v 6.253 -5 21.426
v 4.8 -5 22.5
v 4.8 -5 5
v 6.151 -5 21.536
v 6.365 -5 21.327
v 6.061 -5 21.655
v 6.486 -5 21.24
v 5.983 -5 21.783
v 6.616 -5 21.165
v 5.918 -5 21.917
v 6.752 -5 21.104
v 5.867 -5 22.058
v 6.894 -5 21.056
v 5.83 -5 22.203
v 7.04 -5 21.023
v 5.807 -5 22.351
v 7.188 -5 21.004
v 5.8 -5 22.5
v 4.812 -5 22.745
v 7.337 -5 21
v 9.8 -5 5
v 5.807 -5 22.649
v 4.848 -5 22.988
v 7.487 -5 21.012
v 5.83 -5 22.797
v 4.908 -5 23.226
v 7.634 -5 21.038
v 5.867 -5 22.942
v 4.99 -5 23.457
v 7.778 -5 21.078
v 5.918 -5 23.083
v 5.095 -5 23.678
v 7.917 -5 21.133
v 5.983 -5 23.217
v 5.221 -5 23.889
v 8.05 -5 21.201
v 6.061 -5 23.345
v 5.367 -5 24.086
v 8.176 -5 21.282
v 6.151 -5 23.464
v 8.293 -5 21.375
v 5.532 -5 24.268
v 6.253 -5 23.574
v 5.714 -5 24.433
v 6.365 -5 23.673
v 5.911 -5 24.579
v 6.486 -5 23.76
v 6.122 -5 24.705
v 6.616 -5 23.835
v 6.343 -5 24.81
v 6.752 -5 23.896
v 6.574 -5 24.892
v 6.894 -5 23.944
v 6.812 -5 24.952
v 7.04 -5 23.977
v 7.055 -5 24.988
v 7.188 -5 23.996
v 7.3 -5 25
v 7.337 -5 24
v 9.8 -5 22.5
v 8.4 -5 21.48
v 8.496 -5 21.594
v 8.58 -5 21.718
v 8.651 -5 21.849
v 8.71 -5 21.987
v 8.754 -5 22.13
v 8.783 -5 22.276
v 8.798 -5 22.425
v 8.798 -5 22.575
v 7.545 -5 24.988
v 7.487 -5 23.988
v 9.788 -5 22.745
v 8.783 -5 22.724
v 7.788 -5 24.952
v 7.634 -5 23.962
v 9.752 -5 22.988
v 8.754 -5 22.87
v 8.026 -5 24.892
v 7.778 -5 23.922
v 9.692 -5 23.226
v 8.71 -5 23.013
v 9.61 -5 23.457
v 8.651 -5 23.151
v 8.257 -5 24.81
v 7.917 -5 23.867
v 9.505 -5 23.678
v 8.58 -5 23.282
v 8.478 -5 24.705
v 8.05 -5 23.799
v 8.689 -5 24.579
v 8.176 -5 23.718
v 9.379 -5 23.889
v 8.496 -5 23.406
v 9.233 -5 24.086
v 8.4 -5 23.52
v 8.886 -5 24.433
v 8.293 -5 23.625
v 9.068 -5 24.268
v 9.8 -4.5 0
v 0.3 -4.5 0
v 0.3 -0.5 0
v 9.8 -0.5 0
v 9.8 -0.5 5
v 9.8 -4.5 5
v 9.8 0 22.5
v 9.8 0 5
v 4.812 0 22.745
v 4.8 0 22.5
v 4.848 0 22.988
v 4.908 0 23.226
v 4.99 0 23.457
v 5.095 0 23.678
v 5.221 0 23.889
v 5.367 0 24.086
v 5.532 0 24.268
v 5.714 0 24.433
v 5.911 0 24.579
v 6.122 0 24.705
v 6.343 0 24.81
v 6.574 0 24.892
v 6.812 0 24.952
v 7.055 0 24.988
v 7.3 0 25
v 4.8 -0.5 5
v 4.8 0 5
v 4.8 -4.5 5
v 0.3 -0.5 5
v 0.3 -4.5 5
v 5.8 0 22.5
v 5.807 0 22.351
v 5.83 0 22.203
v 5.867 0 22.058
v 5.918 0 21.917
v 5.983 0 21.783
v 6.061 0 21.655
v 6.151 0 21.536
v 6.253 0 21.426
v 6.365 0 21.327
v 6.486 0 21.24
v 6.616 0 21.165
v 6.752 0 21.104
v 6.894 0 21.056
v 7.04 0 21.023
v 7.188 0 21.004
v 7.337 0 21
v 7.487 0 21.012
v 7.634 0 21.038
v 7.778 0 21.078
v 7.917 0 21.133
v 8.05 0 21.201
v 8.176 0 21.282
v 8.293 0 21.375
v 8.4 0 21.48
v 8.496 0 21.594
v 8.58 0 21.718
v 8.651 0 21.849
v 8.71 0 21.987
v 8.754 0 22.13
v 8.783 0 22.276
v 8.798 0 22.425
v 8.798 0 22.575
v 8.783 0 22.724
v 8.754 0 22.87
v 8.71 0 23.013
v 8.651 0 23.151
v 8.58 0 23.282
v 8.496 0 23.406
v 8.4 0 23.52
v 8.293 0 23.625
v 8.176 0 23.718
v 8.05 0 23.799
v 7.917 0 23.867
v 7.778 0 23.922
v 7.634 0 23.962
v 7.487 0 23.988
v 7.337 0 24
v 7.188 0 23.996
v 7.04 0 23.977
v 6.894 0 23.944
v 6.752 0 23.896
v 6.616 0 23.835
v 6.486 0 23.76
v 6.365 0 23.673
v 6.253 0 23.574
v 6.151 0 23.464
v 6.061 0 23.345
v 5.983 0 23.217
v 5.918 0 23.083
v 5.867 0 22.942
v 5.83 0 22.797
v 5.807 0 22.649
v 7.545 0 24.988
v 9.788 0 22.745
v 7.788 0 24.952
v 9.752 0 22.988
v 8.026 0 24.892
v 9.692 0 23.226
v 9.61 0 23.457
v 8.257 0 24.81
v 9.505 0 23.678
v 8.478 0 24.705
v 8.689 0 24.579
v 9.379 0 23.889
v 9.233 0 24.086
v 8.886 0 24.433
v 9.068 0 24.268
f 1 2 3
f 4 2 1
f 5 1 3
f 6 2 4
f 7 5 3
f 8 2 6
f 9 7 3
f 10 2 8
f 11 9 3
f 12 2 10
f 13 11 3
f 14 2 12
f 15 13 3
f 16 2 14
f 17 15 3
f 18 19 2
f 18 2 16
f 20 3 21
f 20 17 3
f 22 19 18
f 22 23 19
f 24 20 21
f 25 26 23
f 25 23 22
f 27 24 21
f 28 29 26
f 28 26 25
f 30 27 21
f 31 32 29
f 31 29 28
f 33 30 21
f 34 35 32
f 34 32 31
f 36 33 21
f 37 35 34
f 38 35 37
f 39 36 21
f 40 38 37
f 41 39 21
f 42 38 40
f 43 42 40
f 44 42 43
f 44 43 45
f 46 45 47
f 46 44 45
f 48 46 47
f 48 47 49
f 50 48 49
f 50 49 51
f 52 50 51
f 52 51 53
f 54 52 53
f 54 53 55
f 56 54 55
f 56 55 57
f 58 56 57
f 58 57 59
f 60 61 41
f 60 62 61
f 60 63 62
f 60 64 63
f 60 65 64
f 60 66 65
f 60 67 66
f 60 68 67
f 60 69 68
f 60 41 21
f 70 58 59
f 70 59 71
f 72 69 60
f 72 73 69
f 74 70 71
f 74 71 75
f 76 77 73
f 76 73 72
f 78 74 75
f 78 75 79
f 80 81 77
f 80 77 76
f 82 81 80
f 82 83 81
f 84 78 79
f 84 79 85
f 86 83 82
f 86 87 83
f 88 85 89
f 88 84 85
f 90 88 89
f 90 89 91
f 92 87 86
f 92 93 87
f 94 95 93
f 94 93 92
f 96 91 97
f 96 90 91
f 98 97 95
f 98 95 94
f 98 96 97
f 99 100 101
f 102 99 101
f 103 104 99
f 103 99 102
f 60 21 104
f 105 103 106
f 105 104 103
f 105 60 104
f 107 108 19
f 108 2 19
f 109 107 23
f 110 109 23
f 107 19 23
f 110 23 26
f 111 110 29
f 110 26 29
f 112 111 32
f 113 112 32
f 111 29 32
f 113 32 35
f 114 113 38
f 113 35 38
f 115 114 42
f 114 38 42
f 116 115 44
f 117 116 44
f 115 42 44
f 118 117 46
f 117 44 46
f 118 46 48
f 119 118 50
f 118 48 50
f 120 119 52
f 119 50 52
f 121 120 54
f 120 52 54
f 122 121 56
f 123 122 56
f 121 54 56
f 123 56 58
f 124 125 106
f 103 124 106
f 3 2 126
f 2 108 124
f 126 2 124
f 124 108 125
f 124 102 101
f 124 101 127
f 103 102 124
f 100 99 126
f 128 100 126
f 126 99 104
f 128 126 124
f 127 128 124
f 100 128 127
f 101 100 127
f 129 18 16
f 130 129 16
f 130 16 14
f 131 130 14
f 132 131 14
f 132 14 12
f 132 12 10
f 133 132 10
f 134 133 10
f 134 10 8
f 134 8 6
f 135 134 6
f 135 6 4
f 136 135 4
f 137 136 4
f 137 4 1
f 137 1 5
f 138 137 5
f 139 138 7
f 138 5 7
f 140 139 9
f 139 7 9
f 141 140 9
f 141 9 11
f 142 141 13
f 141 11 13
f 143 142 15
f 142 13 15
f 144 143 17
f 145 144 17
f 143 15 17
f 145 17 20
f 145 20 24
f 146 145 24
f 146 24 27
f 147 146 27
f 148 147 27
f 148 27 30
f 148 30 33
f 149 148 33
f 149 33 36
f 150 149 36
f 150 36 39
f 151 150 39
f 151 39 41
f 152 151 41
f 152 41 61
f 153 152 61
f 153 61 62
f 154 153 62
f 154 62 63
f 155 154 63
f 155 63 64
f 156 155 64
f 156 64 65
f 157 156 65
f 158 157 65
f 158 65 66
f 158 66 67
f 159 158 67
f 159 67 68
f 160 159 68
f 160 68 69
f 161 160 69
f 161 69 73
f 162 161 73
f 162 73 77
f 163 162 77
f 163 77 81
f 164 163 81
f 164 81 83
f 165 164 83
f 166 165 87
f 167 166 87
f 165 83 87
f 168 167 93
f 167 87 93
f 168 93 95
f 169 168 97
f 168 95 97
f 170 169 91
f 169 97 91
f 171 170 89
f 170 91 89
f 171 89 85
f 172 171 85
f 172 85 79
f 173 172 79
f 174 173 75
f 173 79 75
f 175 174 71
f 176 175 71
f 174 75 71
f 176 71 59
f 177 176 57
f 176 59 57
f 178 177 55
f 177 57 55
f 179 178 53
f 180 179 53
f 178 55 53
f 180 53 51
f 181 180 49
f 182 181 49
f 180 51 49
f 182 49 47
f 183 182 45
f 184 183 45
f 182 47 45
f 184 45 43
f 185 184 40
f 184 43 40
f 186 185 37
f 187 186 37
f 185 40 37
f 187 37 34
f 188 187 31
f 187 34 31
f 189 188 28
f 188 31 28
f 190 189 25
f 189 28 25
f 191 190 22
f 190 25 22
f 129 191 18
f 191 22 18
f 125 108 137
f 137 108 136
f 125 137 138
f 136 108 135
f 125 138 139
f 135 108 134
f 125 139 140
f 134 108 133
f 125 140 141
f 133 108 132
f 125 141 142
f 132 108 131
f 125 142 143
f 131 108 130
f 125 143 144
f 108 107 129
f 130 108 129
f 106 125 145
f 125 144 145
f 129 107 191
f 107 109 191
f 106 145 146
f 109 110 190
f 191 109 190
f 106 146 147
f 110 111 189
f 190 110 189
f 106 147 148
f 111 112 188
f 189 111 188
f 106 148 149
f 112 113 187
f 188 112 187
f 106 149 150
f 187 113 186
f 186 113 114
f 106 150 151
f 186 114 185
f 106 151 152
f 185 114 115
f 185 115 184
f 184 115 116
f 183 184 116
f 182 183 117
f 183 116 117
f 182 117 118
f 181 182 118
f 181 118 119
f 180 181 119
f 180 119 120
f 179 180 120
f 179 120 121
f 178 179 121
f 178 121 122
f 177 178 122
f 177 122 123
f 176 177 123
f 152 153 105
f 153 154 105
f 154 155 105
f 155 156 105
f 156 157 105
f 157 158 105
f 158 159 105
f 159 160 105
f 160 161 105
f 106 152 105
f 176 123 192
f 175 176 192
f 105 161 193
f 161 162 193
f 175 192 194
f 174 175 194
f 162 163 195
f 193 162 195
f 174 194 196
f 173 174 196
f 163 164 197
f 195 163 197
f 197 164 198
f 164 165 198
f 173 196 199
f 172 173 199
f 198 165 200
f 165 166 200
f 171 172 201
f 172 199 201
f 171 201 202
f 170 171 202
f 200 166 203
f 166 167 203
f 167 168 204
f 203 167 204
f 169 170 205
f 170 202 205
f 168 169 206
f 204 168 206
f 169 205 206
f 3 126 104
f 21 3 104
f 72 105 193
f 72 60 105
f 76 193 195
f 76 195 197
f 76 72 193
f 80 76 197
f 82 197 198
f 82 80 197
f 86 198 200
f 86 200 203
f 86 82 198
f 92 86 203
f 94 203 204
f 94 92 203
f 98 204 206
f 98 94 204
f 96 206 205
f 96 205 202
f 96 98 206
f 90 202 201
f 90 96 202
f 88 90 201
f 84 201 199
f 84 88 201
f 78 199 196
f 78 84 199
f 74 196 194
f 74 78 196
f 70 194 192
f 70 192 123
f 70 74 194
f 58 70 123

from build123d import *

# Parameters (mm, degrees)
F0_W     = 5
F0_H     = 5
F1_DEPTH = 5
F2_D     = 3
F3_R     = 2.49999
F4_W     = 4
F4_H     = 5
F5_DEPTH = 9.5


# Not quite as in the source:
# - a fillet or chamfer is up to 0.001 mm smaller than in the source, because OpenCascade refuses the exact size


with BuildPart() as f1:
    # F0 (on Front) → F1 (new body)
    with BuildSketch(Plane.XZ):
        Polygon((4.8, 5), (9.8, 5), (9.8, 15), (9.8, 20), (4.8, 20), align=None)
        with Locations((7.3, 22.5)):
            Rectangle(F0_W, F0_H)
    extrude(amount=F1_DEPTH)

    # F2 (through all)
    with Locations(Plane(origin=(0, 0, 0), x_dir=(1, 0, 0), z_dir=(0, 1, 0))):
        with Locations((7.3, -22.5)):
            Hole(F2_D / 2)

    # F3 (radius 2.5 in the source; OpenCascade refuses exactly that, so slightly less here)
    f3_edges = [f1.edges().sort_by_distance(p)[0] for p in [
        (4.8, -2.5, 25),
        (9.8, -2.5, 25),
    ]]
    fillet(f3_edges, radius=F3_R)

    # F4 (on face) → F5 (join)
    with BuildSketch(Plane.YZ.offset(9.8)):
        with Locations((-2.5, 2.5)):
            Rectangle(F4_W, F4_H)
    extrude(amount=-F5_DEPTH)


solid = f1.part
